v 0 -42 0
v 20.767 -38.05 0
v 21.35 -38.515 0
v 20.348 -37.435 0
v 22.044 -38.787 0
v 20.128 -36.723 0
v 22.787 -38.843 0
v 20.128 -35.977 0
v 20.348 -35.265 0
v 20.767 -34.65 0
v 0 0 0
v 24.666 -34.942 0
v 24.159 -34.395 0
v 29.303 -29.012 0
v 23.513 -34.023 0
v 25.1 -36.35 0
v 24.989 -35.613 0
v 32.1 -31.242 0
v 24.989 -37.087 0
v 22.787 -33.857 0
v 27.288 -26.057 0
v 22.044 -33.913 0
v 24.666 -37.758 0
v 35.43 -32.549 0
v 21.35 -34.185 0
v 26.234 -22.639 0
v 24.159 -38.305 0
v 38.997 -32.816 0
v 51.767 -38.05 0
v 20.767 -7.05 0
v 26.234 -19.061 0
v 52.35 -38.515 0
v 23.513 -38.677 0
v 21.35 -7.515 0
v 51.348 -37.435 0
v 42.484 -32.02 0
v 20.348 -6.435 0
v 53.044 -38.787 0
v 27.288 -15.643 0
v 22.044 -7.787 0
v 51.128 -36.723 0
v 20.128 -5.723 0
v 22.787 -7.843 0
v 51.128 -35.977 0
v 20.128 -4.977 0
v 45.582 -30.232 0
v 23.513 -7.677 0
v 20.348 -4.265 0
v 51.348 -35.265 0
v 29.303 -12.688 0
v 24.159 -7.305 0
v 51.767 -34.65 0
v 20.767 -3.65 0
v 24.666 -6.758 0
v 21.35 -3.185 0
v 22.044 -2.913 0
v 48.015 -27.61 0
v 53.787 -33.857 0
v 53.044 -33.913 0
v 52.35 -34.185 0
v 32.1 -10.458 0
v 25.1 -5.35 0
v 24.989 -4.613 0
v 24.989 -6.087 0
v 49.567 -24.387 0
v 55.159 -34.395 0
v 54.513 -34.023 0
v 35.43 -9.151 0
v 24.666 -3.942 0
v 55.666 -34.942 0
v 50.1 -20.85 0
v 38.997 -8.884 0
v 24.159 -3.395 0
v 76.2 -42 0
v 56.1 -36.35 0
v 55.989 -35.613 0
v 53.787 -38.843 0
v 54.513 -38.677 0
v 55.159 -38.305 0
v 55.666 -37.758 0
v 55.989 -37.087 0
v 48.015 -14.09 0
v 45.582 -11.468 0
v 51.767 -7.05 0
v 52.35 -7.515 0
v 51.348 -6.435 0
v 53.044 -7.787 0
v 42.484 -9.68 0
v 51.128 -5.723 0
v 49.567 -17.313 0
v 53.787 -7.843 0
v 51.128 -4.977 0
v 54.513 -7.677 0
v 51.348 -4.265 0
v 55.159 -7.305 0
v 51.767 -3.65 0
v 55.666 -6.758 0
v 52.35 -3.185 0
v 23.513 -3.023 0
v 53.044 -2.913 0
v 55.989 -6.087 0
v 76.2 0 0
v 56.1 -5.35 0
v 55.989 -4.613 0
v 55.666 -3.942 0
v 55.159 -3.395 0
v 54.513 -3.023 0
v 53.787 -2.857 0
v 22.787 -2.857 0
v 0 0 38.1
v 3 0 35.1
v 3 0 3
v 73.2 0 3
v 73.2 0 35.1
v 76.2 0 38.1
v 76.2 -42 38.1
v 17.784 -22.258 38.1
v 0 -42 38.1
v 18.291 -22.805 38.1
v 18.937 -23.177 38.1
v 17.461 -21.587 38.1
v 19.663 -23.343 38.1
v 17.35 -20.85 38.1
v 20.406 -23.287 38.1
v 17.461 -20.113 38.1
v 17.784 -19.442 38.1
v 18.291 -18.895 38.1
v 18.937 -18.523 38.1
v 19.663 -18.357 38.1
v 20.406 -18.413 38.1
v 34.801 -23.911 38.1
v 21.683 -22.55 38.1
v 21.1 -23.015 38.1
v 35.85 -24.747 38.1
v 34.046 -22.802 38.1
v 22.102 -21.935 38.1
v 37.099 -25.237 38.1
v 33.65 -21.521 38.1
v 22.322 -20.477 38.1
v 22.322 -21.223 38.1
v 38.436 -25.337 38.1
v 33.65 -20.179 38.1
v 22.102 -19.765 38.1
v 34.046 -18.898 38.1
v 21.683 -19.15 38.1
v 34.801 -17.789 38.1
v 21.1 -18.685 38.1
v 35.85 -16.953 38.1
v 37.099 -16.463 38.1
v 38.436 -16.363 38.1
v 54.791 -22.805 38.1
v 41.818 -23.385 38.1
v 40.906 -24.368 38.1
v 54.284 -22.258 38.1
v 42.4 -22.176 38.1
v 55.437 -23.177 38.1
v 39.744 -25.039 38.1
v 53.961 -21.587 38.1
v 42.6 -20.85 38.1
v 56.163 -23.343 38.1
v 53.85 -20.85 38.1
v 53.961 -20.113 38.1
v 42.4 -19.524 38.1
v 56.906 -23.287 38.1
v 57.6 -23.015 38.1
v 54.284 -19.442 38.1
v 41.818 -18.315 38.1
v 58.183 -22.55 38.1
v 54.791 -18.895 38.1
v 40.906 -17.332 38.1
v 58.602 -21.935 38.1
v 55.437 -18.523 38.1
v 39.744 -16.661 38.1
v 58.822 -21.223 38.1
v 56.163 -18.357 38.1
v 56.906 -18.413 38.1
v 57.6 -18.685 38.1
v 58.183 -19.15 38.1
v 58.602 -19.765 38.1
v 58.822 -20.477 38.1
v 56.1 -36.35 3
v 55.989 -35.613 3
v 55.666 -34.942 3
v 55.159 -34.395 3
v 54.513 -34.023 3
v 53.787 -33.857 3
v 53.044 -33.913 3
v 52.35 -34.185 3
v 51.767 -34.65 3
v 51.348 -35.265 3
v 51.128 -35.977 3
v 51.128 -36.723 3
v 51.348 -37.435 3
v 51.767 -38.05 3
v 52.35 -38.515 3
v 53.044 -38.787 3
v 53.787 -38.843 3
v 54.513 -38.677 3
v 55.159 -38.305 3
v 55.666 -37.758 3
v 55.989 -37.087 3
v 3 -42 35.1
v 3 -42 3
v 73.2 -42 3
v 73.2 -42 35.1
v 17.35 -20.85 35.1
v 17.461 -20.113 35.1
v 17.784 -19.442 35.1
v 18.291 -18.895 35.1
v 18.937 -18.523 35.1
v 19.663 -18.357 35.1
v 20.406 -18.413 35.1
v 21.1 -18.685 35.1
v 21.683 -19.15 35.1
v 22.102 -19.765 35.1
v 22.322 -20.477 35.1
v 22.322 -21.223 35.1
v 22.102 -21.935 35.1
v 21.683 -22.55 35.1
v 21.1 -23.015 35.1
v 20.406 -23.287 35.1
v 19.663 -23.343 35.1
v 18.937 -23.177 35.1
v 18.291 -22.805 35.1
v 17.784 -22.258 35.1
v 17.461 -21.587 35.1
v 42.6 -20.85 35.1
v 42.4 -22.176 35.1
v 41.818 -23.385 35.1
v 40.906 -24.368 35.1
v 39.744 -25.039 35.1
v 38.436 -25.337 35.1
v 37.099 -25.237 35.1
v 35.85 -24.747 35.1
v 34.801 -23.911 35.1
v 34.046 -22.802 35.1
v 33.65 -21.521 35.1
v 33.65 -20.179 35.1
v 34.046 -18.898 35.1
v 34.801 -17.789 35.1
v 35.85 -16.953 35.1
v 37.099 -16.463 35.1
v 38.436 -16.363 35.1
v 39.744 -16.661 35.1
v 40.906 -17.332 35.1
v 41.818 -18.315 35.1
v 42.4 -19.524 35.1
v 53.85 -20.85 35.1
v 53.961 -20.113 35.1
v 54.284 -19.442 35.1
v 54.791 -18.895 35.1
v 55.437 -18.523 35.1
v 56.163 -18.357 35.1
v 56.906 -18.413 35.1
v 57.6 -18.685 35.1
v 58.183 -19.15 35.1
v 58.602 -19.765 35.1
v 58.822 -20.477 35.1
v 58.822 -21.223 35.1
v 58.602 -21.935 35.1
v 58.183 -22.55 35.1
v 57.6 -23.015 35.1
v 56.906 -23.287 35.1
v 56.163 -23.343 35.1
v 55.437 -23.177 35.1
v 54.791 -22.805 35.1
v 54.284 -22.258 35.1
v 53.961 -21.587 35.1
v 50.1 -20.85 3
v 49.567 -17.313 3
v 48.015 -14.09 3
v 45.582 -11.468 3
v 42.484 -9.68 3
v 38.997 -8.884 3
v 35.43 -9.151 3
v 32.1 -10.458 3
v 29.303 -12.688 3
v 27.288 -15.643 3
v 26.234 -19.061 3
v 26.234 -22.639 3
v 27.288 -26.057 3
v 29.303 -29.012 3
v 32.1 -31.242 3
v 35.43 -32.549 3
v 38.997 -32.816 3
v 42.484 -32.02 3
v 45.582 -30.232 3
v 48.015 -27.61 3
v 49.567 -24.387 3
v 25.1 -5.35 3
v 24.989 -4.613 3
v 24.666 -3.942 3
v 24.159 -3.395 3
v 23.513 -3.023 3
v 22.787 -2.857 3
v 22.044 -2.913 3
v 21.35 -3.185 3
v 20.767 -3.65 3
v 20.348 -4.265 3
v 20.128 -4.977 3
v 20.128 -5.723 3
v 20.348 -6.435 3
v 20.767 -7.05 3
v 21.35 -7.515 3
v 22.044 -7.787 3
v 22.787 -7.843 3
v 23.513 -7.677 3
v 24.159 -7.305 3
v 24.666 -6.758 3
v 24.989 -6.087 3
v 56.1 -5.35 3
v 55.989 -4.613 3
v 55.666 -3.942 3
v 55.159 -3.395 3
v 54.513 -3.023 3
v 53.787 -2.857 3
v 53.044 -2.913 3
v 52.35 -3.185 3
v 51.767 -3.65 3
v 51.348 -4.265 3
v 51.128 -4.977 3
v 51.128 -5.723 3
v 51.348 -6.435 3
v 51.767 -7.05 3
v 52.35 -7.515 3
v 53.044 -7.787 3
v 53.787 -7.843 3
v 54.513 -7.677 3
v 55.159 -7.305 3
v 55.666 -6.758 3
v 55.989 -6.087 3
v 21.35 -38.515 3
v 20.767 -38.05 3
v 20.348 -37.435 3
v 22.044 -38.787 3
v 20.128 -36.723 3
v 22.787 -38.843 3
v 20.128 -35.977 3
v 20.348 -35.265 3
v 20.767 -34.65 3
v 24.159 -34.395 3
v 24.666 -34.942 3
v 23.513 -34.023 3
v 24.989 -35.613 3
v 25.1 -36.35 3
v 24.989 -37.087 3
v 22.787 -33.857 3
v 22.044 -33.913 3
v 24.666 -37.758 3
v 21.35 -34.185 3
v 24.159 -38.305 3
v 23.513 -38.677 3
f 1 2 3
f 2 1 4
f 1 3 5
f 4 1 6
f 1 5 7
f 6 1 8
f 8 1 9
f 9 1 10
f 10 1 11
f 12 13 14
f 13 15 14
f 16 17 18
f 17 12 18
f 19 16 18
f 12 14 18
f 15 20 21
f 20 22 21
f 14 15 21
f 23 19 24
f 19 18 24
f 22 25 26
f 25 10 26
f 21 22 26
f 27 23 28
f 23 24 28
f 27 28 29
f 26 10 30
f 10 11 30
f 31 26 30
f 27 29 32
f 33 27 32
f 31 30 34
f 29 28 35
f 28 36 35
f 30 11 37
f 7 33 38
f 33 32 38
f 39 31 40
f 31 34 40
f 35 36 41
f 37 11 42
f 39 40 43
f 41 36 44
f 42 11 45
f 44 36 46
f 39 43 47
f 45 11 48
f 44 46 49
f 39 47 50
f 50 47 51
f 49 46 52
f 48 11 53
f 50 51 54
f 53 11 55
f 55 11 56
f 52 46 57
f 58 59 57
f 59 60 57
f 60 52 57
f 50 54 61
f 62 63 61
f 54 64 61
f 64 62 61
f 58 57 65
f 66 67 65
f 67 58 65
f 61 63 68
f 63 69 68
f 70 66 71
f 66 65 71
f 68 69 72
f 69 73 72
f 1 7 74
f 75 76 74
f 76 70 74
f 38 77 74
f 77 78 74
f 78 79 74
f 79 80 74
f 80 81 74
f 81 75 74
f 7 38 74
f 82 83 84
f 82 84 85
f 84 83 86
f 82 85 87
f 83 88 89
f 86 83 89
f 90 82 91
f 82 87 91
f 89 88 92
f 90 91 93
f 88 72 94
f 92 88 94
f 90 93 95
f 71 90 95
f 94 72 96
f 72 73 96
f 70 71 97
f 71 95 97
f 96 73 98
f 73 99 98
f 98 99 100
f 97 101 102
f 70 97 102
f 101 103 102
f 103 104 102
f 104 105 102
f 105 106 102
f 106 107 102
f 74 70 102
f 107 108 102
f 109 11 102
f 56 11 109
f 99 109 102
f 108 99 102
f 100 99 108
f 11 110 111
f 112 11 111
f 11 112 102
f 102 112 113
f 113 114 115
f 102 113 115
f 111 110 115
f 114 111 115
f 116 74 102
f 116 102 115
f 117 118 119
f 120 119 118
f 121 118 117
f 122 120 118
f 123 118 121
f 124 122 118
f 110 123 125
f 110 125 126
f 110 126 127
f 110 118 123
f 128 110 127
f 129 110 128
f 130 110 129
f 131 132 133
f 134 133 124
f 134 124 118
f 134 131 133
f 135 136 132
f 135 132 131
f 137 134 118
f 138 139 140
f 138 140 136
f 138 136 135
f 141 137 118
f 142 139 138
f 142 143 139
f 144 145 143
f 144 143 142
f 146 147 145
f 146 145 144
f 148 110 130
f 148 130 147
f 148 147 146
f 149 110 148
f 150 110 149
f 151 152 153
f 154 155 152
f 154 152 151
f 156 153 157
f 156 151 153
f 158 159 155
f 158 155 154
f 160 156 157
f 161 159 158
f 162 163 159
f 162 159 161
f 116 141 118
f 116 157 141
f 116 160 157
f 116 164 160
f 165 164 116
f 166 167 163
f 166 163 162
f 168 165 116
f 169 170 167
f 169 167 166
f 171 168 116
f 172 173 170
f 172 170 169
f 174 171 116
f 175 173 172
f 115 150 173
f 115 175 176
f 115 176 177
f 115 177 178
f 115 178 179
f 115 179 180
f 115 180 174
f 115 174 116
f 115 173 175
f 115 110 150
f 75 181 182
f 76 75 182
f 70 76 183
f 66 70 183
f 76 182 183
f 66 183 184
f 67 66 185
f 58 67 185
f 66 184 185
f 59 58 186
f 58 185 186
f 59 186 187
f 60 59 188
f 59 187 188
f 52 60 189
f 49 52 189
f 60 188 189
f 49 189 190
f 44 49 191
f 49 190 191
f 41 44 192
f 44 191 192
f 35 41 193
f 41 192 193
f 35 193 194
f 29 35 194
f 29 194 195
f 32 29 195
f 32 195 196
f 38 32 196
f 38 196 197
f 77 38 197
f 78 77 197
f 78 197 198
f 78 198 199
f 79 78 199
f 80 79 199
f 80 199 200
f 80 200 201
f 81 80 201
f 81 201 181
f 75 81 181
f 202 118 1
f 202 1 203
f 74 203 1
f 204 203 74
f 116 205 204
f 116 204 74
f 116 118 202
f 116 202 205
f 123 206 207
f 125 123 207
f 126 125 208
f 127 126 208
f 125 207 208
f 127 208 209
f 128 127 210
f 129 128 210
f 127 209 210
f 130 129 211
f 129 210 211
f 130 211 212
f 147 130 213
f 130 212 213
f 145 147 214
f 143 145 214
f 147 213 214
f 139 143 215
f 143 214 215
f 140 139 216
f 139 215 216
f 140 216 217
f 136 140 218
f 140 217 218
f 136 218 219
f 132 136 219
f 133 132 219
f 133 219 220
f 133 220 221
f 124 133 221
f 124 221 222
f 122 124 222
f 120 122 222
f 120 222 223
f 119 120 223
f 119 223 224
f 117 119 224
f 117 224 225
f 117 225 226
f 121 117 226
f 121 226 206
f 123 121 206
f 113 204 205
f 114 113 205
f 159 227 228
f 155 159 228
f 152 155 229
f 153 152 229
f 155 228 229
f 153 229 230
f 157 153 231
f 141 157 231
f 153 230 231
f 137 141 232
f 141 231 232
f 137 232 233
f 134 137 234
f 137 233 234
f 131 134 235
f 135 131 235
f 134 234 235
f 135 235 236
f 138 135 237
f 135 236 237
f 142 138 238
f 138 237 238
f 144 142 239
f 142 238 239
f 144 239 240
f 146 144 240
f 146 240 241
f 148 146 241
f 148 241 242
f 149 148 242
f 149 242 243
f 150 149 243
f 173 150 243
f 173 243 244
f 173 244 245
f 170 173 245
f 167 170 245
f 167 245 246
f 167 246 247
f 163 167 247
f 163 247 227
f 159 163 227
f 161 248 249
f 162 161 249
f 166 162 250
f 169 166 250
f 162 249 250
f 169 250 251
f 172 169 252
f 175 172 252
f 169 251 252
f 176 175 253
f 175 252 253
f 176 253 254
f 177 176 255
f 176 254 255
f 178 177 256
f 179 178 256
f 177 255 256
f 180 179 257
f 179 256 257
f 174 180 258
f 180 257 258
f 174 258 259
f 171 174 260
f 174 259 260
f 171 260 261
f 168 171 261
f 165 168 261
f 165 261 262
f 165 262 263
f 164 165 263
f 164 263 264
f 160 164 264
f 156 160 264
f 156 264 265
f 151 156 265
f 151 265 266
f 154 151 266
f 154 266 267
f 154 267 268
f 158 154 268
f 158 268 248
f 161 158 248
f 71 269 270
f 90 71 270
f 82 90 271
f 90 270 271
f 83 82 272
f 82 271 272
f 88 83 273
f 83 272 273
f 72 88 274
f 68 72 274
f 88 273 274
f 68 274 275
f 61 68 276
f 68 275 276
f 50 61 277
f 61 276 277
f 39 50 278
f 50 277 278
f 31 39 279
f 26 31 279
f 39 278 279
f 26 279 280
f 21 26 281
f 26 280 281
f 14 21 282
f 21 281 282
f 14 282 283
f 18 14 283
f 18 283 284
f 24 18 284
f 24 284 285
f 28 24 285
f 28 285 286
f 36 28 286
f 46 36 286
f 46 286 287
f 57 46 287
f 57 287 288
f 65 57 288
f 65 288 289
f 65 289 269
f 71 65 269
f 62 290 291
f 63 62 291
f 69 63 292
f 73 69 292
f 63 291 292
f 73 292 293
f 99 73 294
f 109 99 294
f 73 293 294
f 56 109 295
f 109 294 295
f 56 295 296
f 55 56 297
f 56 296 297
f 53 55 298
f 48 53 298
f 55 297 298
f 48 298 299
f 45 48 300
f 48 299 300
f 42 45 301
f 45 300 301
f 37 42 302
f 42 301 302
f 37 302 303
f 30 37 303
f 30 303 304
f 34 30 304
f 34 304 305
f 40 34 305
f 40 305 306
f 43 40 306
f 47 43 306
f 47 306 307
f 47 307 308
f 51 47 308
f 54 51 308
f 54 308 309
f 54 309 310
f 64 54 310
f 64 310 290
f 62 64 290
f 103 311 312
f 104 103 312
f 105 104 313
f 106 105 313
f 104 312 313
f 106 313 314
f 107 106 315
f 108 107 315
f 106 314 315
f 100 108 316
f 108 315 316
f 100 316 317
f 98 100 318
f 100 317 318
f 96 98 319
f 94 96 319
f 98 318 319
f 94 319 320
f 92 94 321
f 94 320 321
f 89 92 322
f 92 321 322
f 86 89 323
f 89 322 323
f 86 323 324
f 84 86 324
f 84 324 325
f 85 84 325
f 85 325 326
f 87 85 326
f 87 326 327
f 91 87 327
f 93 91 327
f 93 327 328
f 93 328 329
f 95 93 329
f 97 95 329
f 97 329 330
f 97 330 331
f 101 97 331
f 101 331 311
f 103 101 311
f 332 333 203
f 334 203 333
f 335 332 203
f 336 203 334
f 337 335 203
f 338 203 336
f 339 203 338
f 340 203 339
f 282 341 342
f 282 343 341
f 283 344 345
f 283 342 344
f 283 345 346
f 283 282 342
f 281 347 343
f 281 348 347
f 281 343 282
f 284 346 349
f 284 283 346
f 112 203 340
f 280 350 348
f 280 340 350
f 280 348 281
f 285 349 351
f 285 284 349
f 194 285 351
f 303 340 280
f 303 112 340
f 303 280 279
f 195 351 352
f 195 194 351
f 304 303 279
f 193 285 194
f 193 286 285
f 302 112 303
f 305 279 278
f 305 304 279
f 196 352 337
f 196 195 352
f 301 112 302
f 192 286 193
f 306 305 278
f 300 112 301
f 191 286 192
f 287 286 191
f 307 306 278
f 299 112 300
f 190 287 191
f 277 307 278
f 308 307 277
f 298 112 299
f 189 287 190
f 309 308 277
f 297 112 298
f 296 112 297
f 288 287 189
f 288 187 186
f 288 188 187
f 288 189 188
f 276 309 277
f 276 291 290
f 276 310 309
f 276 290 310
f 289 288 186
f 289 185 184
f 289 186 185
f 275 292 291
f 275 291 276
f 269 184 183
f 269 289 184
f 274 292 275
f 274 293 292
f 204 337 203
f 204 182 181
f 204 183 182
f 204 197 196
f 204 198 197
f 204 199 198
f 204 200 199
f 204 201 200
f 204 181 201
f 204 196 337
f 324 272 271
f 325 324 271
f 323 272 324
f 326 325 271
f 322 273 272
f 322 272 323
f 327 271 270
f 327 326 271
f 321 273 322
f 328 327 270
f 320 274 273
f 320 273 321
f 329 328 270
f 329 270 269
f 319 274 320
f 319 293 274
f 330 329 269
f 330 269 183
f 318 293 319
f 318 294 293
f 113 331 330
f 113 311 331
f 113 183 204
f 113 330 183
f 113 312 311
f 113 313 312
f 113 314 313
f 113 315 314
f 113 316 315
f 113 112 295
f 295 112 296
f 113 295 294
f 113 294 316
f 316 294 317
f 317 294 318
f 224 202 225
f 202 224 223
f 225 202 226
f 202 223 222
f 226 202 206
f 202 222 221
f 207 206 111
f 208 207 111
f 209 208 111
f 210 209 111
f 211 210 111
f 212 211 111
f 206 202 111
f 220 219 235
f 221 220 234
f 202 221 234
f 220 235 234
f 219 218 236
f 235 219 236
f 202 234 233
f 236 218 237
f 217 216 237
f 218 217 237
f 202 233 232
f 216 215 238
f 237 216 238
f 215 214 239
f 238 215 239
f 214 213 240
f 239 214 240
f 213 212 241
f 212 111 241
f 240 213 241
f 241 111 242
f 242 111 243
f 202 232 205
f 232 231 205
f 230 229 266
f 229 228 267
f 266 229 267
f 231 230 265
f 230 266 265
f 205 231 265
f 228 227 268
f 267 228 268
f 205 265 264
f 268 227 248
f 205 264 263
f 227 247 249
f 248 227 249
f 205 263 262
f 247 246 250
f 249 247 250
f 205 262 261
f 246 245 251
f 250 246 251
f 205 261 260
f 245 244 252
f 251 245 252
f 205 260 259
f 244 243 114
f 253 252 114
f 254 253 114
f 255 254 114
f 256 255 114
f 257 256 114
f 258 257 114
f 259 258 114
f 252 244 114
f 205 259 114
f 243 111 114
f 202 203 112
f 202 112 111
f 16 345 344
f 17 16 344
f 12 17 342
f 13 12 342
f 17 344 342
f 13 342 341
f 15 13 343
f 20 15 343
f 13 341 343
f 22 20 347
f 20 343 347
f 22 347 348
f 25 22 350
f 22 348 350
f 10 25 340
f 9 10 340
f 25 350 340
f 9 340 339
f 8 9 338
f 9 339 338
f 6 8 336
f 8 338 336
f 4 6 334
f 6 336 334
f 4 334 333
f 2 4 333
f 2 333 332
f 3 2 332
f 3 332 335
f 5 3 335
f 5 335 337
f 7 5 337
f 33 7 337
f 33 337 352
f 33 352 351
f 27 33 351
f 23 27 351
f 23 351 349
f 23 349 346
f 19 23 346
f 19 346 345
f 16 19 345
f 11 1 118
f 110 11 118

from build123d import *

# Parameters (mm, degrees)
F0_W     = 76.2
F0_H     = 38.1
F0_W_2   = 70.2
F0_H_2   = 32.1
F1_DEPTH = 42
F2_R     = 2.5
F2_R_2   = 12
F3_DEPTH = 5
F4_R     = 4.5
F5_DEPTH = 5
F7_D     = 5
F7_DEPTH = 10


with BuildPart() as f1:
    # F0 (on Front) → F1 (new body)
    with BuildSketch(Plane.XZ):
        with Locations((38.1, 19.05)):
            Rectangle(F0_W, F0_H)
        with Locations((38.1, 19.05)):
            Rectangle(F0_W_2, F0_H_2, mode=Mode.SUBTRACT)
    extrude(amount=F1_DEPTH)

    # F2 (on face) → F3 (cut)
    with BuildSketch(Plane.XY.offset(3)):
        with Locations((53.6, -5.35)):
            Circle(F2_R)
        with Locations((53.6, -36.35)):
            Circle(F2_R)
        with Locations((22.6, -36.35)):
            Circle(F2_R)
        with Locations((22.6, -5.35)):
            Circle(F2_R)
        with Locations((38.1, -20.85)):
            Circle(F2_R_2)
    extrude(amount=-F3_DEPTH, mode=Mode.SUBTRACT)

    # F4 (on face) → F5 (cut)
    with BuildSketch(Plane(origin=(0, 0, 35.1), x_dir=(1, 0, 0), z_dir=(0, 0, -1))):
        with Locations((38.1, 20.85)):
            Circle(F4_R)
    extrude(amount=-F5_DEPTH, mode=Mode.SUBTRACT)

    # F7
    with Locations(Plane.XY.offset(38.1)):
        with Locations((19.85, -20.85), (56.35, -20.85)):
            Hole(F7_D / 2, depth=F7_DEPTH)


solid = f1.part
